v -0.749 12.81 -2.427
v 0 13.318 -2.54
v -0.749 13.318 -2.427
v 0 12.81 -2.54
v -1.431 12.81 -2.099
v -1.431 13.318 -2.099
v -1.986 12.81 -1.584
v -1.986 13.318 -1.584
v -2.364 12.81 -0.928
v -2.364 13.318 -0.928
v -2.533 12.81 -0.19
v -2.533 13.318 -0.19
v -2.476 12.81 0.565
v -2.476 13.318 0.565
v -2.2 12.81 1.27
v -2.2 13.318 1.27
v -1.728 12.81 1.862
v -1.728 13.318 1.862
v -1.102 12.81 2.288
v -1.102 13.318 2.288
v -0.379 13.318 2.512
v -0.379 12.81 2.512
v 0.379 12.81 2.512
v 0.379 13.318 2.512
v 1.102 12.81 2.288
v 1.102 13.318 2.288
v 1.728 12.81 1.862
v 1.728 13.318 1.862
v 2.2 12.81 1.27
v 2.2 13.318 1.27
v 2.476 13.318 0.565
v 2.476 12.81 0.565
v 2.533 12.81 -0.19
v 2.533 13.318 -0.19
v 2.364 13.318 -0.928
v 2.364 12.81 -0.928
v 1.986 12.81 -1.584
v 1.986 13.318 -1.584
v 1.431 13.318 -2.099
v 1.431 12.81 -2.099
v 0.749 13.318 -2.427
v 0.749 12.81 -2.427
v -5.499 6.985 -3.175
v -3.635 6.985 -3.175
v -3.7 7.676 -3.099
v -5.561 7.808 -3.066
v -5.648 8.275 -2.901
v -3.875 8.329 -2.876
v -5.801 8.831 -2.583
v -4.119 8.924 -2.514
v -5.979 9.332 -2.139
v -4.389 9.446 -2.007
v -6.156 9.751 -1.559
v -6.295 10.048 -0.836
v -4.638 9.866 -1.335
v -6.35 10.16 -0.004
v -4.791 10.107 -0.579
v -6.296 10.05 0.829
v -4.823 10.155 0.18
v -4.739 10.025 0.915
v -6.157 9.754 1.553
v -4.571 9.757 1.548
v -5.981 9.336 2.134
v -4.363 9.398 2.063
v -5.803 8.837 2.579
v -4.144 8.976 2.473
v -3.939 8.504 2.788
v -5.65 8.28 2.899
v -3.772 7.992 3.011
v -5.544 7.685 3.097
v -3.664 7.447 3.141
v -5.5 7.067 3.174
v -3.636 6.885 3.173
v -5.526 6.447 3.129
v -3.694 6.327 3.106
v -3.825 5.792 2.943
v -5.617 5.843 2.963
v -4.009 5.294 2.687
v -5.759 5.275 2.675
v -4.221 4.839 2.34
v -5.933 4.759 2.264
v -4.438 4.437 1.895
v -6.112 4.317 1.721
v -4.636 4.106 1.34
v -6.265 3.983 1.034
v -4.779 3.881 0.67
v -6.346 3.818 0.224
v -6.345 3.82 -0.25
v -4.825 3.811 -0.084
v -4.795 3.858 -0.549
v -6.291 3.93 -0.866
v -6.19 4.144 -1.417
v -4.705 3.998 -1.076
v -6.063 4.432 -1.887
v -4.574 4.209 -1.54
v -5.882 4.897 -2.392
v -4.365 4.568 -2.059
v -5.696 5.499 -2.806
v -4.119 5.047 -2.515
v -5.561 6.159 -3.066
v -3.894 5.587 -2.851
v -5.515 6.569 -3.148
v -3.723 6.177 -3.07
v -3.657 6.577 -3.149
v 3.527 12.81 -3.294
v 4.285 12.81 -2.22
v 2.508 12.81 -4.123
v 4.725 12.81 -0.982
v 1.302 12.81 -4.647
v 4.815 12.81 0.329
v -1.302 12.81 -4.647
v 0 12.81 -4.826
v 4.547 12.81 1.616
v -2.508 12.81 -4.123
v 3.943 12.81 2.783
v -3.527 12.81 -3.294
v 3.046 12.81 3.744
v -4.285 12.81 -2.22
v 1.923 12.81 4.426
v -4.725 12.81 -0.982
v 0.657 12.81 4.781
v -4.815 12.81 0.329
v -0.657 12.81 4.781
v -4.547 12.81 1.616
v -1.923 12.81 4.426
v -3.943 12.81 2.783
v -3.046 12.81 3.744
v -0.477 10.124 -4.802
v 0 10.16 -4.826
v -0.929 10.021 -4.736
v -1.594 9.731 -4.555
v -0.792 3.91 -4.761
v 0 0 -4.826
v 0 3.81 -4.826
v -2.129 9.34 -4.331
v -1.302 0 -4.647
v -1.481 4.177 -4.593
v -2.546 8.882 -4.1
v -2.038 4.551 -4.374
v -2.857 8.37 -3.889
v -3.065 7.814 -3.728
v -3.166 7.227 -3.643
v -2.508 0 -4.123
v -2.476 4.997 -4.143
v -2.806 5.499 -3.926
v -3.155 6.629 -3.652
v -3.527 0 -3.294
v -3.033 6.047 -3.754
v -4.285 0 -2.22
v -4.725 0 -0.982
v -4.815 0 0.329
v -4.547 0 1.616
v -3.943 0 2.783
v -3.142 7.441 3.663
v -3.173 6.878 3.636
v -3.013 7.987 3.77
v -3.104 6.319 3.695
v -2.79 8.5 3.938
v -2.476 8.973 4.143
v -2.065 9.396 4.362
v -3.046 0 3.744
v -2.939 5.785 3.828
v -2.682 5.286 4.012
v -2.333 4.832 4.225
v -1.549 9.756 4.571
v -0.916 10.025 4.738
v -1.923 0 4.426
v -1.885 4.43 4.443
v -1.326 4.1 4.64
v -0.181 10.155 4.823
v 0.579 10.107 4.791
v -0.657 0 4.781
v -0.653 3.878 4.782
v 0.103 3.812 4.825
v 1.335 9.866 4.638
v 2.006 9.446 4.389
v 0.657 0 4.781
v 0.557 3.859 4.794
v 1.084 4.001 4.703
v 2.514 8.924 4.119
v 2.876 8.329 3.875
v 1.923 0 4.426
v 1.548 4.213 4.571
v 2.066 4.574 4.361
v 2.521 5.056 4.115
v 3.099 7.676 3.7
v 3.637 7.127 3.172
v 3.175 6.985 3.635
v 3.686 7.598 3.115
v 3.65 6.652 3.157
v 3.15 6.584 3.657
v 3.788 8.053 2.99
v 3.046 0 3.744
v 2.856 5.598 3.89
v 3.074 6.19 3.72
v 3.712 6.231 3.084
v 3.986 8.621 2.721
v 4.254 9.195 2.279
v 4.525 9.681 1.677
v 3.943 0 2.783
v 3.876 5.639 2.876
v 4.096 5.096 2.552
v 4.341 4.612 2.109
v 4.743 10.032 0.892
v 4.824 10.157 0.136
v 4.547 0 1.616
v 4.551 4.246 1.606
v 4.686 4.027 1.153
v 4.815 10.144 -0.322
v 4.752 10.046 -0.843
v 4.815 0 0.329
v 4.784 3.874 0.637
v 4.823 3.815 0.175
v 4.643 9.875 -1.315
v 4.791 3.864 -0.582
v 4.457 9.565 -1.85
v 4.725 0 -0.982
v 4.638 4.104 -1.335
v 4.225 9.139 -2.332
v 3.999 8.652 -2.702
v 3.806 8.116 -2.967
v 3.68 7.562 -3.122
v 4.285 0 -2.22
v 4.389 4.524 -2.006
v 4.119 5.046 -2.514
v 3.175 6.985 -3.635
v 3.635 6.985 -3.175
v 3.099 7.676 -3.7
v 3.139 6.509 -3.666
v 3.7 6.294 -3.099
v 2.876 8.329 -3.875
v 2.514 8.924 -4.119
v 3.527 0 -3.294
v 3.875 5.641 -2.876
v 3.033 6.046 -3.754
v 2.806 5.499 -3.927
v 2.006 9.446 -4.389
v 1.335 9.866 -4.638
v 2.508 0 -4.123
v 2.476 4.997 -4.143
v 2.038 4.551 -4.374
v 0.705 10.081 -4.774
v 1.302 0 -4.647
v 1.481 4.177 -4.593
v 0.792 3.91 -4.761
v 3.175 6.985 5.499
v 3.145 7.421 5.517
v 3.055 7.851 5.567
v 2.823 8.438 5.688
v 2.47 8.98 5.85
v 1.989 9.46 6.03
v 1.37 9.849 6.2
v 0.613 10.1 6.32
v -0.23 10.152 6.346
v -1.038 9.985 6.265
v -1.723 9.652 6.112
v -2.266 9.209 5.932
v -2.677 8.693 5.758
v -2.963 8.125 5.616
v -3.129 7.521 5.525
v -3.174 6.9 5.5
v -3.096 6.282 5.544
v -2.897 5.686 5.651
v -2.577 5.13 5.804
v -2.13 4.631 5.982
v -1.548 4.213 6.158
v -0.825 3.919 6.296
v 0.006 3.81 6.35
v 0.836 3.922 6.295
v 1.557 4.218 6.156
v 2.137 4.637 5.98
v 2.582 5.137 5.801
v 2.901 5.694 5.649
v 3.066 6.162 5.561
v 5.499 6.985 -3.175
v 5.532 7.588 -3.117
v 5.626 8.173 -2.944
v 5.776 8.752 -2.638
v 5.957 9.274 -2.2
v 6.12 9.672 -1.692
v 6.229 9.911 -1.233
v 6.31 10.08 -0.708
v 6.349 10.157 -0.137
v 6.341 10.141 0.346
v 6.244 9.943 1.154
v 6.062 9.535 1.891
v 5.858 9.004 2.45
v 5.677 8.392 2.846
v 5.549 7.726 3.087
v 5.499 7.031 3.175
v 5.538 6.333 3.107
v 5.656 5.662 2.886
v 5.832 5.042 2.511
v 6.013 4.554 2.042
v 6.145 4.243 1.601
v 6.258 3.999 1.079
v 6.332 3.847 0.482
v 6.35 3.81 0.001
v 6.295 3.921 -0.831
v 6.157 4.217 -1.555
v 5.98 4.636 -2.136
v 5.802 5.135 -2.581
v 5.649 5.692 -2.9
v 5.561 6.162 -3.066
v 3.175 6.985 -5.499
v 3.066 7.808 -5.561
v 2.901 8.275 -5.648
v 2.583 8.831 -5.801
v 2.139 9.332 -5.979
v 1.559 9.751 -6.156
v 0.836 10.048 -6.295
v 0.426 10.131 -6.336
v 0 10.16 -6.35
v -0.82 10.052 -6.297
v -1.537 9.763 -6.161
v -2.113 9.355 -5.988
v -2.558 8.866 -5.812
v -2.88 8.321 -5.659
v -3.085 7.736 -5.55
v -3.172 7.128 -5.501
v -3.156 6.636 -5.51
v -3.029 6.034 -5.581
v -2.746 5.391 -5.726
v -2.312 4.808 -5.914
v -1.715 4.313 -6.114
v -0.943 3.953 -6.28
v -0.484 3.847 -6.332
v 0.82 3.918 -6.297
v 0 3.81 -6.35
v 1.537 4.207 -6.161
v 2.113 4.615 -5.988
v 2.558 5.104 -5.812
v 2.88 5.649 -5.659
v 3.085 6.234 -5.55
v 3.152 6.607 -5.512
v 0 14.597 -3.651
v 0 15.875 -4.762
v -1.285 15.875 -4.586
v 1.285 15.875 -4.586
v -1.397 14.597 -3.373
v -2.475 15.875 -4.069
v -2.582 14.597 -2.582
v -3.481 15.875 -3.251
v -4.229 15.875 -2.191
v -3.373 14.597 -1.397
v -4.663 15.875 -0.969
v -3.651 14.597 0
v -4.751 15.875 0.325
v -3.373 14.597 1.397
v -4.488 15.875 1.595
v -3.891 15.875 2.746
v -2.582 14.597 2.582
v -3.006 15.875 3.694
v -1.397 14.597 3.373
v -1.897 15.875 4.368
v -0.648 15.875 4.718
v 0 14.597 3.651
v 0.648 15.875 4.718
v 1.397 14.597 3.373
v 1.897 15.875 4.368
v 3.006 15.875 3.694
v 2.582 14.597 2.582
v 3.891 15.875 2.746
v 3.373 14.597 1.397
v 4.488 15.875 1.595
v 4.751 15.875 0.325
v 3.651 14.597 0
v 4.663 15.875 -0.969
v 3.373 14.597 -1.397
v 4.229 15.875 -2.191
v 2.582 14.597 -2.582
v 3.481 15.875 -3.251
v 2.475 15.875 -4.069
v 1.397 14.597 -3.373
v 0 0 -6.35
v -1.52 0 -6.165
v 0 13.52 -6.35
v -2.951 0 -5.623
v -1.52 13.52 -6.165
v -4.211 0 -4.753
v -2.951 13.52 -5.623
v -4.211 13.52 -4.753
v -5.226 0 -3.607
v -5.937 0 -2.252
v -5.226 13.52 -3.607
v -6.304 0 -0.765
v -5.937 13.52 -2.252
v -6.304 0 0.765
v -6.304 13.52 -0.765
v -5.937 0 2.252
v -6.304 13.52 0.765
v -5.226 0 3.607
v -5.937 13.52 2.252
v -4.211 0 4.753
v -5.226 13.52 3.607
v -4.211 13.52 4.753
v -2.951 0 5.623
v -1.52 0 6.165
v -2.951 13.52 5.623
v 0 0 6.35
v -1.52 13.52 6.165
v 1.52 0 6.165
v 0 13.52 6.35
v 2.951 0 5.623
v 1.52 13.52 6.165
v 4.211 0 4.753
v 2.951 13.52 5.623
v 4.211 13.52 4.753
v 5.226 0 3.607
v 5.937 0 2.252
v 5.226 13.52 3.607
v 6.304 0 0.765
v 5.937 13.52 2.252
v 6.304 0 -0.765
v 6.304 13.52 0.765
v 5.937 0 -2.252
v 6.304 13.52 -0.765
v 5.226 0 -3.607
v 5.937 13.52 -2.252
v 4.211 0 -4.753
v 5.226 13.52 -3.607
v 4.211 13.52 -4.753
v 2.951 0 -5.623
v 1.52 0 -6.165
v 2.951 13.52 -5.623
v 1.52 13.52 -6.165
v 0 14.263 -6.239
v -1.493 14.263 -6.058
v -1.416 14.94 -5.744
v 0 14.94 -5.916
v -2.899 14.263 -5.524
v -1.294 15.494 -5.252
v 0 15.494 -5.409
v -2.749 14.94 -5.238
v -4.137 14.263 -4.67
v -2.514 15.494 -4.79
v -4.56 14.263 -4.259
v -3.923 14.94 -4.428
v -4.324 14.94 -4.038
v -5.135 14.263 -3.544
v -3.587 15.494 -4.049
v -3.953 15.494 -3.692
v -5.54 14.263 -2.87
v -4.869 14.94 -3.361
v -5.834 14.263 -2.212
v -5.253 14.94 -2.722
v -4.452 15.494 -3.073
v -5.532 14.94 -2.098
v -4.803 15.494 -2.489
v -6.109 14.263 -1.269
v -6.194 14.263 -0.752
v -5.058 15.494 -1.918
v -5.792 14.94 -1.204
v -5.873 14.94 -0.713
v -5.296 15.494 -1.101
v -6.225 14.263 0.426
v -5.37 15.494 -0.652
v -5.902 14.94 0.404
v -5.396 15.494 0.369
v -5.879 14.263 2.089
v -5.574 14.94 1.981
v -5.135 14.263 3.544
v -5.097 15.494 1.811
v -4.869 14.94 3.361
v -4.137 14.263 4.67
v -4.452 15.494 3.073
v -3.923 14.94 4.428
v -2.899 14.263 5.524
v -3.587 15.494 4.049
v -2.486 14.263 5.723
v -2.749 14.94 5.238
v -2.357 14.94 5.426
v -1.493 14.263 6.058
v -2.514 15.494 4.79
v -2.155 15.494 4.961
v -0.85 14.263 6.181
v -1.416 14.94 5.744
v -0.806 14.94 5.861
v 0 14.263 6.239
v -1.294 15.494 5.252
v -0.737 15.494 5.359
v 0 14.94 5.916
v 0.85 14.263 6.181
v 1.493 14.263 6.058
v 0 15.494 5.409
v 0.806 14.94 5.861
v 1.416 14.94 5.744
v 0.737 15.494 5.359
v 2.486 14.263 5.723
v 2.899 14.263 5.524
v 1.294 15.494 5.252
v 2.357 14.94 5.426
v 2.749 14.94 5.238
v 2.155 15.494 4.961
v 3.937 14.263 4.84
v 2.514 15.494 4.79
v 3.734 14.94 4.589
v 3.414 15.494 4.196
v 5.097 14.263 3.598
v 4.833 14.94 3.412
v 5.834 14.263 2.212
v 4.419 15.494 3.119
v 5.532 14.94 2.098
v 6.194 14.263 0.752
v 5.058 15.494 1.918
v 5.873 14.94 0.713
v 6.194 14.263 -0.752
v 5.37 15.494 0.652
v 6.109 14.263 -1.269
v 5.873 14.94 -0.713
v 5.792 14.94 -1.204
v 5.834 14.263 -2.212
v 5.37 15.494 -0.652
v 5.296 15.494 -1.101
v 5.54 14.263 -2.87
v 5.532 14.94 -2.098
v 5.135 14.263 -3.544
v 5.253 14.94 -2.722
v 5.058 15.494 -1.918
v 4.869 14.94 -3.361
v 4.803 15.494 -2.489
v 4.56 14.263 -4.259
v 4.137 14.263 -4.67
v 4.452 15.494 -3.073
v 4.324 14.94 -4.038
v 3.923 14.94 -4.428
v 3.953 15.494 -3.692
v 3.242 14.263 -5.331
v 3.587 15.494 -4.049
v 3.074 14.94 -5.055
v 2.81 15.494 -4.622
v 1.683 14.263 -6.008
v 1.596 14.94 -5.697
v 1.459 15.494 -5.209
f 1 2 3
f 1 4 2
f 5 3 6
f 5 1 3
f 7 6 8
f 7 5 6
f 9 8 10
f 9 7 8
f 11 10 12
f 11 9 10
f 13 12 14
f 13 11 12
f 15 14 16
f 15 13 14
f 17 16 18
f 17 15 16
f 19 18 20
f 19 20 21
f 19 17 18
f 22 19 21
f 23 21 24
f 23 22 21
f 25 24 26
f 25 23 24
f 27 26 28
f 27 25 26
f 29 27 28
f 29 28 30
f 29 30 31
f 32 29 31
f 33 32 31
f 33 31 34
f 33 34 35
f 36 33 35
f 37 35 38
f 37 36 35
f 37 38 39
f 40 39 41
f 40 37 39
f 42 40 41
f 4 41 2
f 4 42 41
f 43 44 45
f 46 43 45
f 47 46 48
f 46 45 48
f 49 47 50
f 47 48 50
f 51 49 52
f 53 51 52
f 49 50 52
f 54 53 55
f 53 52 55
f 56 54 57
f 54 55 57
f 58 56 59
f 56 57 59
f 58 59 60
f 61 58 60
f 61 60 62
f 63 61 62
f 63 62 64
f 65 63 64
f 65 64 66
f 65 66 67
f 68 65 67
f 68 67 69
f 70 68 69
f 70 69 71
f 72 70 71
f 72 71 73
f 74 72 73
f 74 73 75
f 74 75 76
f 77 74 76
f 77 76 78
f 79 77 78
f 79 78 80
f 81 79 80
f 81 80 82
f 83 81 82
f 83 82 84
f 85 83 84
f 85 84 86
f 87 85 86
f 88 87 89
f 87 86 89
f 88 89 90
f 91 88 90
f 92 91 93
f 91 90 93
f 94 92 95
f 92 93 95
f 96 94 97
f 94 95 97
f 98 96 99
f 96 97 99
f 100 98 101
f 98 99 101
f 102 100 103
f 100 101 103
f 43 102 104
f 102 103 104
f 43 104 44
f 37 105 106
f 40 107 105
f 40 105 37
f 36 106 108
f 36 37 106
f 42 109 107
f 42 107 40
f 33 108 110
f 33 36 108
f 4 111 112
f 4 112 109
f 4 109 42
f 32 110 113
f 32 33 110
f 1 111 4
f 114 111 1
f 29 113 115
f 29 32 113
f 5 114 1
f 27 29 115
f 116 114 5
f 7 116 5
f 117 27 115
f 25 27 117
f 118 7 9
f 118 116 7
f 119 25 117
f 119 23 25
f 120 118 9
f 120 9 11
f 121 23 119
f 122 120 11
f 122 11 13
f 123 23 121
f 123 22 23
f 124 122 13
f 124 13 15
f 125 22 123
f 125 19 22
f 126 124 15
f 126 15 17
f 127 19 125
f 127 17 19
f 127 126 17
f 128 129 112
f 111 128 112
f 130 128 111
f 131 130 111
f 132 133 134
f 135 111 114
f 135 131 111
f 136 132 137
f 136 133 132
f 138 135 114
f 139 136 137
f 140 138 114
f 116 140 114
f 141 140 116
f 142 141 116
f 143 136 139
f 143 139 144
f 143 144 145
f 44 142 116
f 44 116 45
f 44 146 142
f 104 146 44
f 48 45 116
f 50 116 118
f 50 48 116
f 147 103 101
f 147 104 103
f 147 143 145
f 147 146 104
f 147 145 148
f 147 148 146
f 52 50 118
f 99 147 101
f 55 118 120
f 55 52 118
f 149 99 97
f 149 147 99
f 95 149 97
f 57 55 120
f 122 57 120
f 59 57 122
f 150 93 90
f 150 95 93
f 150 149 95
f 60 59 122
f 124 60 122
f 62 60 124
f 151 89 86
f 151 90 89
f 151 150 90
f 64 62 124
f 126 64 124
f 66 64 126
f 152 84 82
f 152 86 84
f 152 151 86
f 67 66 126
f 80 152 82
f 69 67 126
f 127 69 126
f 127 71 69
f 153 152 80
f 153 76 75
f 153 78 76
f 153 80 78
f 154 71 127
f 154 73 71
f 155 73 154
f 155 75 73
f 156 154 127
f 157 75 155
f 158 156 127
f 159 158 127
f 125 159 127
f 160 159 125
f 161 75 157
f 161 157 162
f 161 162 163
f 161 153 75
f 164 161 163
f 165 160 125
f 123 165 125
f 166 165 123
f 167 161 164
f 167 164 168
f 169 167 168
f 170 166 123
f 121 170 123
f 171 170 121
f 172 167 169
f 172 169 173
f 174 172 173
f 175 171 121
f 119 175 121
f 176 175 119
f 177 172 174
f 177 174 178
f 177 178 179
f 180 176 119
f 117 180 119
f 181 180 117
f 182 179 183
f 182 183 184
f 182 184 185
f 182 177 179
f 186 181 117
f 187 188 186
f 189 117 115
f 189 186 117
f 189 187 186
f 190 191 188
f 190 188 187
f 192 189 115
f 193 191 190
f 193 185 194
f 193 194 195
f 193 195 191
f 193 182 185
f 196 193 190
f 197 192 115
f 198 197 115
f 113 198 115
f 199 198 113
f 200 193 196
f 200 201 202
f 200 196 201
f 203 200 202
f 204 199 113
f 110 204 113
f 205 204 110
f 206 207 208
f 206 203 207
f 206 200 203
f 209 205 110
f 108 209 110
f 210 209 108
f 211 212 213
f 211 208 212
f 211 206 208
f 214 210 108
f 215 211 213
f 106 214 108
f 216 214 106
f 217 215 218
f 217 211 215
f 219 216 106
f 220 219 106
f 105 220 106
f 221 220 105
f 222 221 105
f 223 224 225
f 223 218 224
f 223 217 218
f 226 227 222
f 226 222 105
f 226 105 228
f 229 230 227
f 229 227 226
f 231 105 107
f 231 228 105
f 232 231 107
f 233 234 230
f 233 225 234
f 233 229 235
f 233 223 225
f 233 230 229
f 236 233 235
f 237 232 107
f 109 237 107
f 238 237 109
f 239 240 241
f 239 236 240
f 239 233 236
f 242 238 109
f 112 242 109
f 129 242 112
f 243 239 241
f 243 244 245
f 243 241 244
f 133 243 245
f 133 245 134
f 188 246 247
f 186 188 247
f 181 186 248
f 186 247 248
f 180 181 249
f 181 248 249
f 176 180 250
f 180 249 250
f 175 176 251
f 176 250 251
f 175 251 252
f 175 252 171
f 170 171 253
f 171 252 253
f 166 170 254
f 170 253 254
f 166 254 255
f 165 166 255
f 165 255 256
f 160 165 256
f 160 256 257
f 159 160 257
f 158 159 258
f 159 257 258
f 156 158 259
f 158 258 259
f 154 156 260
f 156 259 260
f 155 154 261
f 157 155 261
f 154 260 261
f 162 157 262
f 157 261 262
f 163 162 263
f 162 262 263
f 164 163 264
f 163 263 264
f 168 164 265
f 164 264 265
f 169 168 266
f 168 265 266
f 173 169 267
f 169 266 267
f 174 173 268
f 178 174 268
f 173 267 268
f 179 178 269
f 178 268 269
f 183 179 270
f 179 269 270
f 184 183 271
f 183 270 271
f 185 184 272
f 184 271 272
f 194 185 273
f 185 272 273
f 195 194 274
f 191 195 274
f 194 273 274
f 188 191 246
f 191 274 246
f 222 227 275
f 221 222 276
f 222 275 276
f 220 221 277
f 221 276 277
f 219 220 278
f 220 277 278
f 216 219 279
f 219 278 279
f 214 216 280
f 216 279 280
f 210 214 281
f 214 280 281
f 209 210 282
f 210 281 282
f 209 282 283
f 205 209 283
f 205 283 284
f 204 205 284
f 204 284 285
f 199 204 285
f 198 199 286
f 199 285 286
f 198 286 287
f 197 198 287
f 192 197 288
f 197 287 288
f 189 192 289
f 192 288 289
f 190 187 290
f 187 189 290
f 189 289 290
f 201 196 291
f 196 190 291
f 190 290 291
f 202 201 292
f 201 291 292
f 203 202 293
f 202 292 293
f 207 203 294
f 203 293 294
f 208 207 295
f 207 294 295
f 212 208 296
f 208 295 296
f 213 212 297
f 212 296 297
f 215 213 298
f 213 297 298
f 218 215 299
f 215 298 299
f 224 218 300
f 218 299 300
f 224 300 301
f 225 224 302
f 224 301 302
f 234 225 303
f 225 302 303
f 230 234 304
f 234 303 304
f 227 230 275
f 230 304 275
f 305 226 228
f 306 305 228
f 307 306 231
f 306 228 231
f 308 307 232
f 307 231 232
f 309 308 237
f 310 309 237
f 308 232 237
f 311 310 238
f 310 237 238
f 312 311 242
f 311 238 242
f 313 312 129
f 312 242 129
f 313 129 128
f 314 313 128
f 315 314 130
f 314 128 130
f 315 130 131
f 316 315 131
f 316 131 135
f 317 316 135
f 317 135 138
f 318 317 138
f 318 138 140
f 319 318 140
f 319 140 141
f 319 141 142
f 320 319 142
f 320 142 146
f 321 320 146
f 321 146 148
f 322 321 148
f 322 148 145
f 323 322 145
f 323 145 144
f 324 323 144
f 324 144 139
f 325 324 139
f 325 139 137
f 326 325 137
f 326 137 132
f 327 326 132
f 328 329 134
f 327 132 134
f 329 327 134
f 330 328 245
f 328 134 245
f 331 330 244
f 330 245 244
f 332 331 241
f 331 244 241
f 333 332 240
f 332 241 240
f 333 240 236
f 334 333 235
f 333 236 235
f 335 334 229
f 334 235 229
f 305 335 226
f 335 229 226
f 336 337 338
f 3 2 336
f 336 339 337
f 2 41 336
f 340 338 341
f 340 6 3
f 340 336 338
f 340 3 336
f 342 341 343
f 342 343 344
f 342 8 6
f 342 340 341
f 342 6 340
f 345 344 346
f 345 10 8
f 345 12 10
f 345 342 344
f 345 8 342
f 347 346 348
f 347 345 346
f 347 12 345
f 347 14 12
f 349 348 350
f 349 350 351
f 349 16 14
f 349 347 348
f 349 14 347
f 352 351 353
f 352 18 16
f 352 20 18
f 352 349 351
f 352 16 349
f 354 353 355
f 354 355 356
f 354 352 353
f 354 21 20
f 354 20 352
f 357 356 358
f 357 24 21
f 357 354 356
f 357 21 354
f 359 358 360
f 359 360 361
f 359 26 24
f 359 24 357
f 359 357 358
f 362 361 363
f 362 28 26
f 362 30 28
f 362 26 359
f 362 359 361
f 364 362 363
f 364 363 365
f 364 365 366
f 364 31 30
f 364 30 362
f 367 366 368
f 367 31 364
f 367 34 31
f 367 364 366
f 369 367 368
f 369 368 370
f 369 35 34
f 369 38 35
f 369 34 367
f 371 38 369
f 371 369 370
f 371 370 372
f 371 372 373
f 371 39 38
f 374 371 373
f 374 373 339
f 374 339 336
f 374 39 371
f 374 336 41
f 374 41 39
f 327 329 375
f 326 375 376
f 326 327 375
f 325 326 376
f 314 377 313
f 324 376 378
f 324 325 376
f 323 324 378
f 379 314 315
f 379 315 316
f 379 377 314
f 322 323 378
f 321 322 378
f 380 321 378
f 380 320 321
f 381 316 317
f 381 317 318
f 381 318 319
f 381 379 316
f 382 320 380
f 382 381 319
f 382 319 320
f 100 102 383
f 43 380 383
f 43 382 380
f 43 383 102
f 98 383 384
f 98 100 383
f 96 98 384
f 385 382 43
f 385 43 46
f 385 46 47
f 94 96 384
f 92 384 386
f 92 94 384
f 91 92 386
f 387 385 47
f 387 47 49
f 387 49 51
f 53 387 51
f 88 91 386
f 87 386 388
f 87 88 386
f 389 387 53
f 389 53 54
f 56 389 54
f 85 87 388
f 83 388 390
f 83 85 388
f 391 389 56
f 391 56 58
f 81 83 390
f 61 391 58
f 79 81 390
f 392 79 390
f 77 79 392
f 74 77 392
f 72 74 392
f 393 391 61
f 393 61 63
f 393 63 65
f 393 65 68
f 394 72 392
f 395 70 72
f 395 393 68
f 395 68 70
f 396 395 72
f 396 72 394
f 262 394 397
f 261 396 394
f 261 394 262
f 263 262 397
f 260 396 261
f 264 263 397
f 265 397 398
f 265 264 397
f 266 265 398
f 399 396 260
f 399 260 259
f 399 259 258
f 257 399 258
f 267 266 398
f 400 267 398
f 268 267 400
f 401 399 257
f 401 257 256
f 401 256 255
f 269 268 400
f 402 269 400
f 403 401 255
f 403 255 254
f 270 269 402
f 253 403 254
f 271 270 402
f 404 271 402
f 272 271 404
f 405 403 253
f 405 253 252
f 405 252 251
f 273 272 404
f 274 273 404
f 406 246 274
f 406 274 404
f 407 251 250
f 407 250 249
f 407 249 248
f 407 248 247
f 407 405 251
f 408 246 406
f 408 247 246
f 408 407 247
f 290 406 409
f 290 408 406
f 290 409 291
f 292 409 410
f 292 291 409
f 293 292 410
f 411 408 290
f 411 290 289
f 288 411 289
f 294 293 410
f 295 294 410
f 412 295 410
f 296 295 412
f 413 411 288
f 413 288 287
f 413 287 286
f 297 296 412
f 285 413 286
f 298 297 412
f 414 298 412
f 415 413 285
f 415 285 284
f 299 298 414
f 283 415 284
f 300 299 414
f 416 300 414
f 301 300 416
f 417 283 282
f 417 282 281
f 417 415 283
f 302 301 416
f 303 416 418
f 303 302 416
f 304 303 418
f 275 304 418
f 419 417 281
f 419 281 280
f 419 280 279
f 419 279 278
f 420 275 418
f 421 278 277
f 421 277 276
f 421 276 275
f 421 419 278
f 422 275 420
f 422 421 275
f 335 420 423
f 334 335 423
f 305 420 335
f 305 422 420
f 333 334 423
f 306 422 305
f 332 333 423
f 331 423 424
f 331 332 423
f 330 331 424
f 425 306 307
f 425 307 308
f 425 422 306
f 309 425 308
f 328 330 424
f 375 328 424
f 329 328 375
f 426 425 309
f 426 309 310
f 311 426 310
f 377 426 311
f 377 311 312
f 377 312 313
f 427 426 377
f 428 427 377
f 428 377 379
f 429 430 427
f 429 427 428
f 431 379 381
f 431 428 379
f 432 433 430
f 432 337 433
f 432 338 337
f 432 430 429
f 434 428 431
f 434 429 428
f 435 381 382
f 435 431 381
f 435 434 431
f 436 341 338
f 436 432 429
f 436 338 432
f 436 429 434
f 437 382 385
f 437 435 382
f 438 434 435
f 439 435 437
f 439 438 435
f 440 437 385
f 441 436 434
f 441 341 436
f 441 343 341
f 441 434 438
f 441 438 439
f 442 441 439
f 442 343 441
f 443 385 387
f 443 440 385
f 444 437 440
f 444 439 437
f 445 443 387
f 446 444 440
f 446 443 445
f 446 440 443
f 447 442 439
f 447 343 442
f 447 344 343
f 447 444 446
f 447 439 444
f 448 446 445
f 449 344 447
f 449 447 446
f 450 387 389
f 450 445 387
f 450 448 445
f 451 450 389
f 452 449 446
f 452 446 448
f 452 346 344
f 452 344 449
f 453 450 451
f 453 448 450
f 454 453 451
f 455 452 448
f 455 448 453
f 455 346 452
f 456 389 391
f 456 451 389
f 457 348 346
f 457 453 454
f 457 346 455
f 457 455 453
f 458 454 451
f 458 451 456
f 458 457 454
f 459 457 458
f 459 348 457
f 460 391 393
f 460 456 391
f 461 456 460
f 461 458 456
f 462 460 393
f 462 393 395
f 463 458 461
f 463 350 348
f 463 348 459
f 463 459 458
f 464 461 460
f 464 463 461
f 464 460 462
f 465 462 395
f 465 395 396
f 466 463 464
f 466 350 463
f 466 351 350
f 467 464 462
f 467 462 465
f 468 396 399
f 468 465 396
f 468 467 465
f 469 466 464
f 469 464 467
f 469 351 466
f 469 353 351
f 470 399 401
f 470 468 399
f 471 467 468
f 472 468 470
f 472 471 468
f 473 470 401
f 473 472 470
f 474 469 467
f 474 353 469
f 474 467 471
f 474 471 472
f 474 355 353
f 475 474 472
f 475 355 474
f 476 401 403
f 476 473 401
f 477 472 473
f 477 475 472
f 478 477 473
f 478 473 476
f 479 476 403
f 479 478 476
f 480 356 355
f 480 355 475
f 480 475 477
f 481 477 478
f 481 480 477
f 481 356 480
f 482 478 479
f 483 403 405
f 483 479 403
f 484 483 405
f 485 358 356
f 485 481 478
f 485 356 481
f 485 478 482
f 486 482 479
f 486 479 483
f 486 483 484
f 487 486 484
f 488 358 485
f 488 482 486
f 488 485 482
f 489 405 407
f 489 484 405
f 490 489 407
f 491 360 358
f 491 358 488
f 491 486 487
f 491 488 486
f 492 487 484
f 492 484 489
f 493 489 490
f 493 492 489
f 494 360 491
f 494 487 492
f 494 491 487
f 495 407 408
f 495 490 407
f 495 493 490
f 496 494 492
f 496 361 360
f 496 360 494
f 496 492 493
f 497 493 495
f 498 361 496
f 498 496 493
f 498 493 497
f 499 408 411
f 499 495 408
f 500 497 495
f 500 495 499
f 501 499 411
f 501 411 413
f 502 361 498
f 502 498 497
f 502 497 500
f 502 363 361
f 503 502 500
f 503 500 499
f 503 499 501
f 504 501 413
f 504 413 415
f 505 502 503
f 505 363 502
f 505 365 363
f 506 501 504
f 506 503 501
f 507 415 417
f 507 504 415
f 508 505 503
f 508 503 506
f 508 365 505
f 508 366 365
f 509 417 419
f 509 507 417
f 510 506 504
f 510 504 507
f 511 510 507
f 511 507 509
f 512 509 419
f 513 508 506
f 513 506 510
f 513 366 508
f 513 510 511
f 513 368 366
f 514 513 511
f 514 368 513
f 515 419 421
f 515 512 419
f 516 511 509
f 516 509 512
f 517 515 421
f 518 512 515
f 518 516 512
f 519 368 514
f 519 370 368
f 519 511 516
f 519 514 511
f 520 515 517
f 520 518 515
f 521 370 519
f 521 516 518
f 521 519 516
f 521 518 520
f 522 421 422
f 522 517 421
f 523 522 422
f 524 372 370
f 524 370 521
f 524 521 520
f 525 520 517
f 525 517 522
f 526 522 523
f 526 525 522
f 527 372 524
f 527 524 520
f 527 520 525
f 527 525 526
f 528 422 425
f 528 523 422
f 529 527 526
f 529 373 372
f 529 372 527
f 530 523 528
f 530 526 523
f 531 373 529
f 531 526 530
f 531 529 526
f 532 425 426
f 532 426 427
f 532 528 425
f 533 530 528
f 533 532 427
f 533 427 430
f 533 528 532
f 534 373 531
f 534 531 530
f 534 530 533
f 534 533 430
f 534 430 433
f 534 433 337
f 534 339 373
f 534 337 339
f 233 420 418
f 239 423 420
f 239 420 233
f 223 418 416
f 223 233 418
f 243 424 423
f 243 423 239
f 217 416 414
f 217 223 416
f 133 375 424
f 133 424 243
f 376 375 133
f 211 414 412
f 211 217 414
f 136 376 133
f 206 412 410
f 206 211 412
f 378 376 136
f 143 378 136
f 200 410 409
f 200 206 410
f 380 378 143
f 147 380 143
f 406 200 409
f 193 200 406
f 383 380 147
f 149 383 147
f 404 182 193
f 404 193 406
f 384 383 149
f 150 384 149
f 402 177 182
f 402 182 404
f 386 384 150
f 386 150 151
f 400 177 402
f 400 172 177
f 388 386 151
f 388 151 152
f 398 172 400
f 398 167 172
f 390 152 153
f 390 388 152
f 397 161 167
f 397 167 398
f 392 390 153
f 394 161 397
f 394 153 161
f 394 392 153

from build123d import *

# Parameters (mm, degrees)
FILLET1_R          = 2.54
SKETCH2_R          = 3.175
CUT_EXTRUDE1_DEPTH = 19.238986472
CIRPATTERN1_COUNT  = 4


with BuildPart() as part:
    # Sketch1 → Revolve1 (revolve)
    with BuildSketch(Plane.XY, mode=Mode.PRIVATE) as revolve1_sk:
        Polygon((6.35, 0), (6.35, 15.875), (4.7625, 15.875), (2.54, 13.318306215), (2.54, 12.810306215), (4.826, 12.810306215), (4.826, 0), align=None)
    revolve(revolve1_sk.sketch.rotate(Axis((0, 0, 0), (0, 1, 0)), 90), axis=Axis((0, 0, 0), (0, 1, 0)))

    # Fillet1
    # the kernel refuses this fillet: 2.54 mm, written as the material it takes off along each edge
    with BuildSketch(Plane(origin=(0, 15.875, 0), x_dir=(0, 0, -1), z_dir=(1, 0, 0))) as fillet1_piece_1:
        with BuildLine():
            CenterArc((3.81, -2.35464302), FILLET1_R, 0, 67.975687163)
            Line((4.7625, 0), (4.78155, 0.04709286))
            ThreePointArc((4.78155, 0.04709286), (5.55625, 0.0508), (6.35, 0.0508))
            Line((6.35, 0.0508), (6.4008, 0))
            Line((6.4008, 0), (6.4008, -2.35464302))
            Line((6.4008, -2.35464302), (6.35, -2.35464302))
        make_face()
    revolve(axis=Axis((0, 15.875, 0), (0, 1, 0)), mode=Mode.SUBTRACT)

    # Sketch2 → Cut-Extrude1 (cut, symmetric)
    with BuildSketch(Plane(origin=(0, 0, 0), x_dir=(0, 0, -1), z_dir=(1, 0, 0))):
        with Locations((0, 6.985)):
            Circle(SKETCH2_R)
    cut_extrude1 = extrude(amount=CUT_EXTRUDE1_DEPTH, both=True, mode=Mode.SUBTRACT)

    # CirPattern1: Cut-Extrude1 ×4 about axis
    cirpattern1_axis = Axis((0, 12.810306215, 0), (0, -1, 0))
    for i in range(1, CIRPATTERN1_COUNT):
        add(cut_extrude1.rotate(cirpattern1_axis, i * 360 / CIRPATTERN1_COUNT), mode=Mode.SUBTRACT)


solid = part.part
